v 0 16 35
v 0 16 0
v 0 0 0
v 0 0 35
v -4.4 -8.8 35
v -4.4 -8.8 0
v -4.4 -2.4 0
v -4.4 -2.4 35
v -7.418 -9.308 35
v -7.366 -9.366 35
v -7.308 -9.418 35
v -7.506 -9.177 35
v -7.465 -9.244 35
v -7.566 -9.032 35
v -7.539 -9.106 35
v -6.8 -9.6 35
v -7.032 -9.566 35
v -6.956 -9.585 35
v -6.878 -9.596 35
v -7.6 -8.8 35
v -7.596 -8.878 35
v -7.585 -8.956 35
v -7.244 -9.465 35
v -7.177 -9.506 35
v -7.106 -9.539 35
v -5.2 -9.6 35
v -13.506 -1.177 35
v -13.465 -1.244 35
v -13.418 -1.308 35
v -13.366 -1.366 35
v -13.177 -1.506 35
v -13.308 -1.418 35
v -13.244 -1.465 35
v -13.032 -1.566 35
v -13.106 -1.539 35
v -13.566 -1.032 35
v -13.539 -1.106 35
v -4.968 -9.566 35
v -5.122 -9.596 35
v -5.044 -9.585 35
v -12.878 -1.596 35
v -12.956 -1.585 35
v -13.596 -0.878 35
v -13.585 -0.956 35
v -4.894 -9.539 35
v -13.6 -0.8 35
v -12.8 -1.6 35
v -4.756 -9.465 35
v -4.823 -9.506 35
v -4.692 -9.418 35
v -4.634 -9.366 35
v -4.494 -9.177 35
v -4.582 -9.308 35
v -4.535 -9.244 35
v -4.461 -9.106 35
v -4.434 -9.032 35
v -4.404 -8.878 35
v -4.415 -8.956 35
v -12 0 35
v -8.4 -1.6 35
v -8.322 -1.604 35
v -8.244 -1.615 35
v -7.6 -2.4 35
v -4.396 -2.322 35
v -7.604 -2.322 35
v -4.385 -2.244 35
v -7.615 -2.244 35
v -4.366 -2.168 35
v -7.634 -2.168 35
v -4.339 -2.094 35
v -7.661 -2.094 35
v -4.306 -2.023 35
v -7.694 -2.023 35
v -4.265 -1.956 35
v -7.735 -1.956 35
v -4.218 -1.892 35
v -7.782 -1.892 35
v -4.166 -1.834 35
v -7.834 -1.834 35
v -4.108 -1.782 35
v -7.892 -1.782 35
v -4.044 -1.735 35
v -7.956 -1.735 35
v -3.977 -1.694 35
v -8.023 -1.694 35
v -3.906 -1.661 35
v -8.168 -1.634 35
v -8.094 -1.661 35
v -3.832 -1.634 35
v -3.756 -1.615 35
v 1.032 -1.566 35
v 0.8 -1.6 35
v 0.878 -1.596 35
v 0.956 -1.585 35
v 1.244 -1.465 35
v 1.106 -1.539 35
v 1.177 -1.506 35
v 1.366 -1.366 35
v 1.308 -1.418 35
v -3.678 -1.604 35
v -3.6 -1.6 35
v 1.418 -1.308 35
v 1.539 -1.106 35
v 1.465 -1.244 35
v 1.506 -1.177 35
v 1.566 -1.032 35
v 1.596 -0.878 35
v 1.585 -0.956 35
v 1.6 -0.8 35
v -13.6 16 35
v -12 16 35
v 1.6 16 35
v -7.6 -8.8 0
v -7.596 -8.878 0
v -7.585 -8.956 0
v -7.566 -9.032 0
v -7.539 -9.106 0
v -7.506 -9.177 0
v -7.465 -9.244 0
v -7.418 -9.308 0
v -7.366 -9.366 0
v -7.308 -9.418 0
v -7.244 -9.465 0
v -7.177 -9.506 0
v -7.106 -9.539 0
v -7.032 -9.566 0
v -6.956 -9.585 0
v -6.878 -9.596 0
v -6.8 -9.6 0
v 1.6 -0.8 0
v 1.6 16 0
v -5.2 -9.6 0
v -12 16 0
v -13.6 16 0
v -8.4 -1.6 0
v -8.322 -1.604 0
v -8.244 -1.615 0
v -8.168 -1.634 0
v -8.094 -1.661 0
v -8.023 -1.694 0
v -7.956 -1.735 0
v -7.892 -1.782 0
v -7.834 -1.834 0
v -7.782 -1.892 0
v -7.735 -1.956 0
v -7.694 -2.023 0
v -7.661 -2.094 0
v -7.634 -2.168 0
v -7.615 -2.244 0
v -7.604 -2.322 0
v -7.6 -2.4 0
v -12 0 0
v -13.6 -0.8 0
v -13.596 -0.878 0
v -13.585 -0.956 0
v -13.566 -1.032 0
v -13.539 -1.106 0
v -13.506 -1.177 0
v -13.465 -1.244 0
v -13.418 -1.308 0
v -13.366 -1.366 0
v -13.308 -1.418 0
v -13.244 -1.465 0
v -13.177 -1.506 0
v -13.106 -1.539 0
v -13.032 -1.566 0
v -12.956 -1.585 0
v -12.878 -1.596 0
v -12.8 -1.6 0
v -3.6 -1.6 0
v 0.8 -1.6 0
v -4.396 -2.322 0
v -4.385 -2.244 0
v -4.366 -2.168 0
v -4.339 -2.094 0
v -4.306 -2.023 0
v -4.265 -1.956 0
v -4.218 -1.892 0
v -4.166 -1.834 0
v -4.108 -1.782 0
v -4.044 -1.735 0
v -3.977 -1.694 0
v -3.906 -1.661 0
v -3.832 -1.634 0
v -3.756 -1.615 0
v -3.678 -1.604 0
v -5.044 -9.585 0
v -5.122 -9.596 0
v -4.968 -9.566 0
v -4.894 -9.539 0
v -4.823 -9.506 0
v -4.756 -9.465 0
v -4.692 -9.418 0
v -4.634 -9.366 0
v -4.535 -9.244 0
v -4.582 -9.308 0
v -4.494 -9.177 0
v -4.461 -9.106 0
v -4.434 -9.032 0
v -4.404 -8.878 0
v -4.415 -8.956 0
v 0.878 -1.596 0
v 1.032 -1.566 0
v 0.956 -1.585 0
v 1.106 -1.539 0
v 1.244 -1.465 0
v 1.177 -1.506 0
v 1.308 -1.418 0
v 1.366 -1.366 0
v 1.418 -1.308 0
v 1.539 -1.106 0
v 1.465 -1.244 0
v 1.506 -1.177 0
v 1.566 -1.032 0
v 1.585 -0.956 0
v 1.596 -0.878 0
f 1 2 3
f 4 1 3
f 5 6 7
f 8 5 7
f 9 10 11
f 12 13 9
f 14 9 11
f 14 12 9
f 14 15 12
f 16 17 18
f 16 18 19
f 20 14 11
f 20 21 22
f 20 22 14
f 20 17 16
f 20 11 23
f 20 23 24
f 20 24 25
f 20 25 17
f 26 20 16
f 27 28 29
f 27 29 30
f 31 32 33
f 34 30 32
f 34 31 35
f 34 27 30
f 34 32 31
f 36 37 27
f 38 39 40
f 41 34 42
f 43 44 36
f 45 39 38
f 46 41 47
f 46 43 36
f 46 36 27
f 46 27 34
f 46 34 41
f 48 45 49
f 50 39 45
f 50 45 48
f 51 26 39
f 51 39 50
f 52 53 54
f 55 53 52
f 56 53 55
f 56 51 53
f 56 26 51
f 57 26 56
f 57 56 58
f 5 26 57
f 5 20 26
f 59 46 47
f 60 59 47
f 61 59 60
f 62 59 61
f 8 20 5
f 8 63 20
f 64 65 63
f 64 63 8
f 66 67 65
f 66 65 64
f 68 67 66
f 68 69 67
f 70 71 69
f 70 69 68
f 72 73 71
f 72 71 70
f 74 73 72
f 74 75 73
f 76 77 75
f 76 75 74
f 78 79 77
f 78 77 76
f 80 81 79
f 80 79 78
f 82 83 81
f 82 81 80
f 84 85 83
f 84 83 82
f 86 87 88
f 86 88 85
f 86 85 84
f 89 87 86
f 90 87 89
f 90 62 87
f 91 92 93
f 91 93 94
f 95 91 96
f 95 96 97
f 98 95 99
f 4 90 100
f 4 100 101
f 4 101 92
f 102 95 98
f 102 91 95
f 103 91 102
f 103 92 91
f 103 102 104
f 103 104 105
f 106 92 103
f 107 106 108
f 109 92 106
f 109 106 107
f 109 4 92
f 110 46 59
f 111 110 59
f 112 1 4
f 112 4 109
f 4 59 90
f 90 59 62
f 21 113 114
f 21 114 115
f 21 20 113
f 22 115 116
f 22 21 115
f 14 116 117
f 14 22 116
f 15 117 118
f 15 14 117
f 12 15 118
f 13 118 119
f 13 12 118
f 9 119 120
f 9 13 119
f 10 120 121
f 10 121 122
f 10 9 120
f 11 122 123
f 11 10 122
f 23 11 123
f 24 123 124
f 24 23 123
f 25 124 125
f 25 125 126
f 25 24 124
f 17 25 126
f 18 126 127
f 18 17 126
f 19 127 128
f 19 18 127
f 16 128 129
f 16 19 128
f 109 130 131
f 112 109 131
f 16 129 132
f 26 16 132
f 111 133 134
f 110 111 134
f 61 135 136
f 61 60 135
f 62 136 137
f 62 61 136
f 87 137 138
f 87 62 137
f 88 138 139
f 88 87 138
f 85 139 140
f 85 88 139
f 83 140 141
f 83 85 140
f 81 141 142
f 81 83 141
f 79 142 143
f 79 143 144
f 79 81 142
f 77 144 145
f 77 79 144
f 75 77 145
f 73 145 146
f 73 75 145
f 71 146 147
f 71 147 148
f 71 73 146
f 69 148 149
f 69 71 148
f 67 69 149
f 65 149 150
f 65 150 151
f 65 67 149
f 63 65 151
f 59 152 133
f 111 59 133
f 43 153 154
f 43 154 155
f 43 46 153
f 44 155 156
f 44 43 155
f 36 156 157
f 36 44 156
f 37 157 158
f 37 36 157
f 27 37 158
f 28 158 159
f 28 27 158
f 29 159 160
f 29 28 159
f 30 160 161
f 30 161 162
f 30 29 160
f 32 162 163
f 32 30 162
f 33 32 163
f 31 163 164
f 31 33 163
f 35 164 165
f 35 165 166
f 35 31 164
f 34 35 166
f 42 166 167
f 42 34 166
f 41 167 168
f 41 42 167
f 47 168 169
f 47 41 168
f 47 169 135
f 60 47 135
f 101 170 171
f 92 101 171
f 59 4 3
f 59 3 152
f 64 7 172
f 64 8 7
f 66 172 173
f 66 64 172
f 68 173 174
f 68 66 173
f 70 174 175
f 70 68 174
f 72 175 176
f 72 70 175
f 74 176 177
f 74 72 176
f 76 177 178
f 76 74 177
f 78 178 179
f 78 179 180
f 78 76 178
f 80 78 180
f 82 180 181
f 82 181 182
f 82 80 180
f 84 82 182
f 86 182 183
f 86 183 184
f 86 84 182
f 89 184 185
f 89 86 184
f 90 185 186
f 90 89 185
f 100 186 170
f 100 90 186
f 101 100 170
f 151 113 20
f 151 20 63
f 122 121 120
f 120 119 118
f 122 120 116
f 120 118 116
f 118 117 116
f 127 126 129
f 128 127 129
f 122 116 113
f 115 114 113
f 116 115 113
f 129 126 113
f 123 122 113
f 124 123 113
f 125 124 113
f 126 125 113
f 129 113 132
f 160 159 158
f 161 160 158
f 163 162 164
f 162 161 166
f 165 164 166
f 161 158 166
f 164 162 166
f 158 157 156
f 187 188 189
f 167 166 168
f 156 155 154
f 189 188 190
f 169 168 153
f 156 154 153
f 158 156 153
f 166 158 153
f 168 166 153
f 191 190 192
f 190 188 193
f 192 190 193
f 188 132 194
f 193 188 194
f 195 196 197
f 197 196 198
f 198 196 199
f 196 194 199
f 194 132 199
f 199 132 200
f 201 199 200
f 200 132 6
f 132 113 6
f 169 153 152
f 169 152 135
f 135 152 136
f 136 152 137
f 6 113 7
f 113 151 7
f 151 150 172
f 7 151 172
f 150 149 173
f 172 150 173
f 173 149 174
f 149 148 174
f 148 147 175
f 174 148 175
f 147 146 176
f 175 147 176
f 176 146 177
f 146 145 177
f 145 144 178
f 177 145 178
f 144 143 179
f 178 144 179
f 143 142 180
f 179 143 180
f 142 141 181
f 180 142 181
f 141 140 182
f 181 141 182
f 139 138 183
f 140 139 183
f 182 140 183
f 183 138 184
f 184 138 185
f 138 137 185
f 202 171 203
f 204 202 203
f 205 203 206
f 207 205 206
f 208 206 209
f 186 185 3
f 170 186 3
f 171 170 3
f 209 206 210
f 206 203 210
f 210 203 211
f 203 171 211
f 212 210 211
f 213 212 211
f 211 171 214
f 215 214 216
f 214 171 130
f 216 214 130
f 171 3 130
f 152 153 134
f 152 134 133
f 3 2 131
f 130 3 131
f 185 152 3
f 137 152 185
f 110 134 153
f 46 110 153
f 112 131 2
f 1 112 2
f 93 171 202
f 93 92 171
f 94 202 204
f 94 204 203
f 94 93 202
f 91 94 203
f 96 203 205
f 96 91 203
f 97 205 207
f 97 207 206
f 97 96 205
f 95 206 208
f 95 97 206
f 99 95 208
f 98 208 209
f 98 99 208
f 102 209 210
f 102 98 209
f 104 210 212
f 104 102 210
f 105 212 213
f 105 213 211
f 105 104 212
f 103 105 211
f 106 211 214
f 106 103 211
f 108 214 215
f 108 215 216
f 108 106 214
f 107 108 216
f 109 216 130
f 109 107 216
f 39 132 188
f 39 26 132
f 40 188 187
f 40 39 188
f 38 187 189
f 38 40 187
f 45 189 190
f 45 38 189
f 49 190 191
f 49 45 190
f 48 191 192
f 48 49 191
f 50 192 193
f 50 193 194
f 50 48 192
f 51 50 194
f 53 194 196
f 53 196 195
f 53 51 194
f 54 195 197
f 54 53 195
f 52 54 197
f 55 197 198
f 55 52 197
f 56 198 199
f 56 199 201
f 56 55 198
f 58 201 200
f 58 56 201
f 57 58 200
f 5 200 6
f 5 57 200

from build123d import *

# Parameters (mm, degrees)
F0_W     = 3.2
F0_H     = 8
F1_DEPTH = 35
F2_R     = 0.8


# Not quite as in the source:
# - a feature names something its author has since deleted; it is built from what else it names


with BuildPart() as f1:
    # F0 (on Top) → F1 (new body)
    with BuildSketch(Plane.XY):
        Polygon((0, 16), (0, 0), (-12, 0), (-12, 16), (-13.6, 16), (-13.6, -1.6), (-7.6, -1.6), (-4.4, -1.6), (1.6, -1.6), (1.6, 16), align=None)
        with Locations((-6, -5.6)):
            Rectangle(F0_W, F0_H)
    extrude(amount=F1_DEPTH)

    # F2
    f2_edges = [f1.edges().sort_by_distance(p)[0] for p in [
        (1.6, -1.6, 17.5),
        (-13.6, -1.6, 17.5),
        (-7.6, -1.6, 17.5),
        (-4.4, -1.6, 17.5),
        (-7.6, -9.6, 17.5),
        (-4.4, -9.6, 17.5),
    ]]
    fillet(f2_edges, radius=F2_R)


solid = f1.part
